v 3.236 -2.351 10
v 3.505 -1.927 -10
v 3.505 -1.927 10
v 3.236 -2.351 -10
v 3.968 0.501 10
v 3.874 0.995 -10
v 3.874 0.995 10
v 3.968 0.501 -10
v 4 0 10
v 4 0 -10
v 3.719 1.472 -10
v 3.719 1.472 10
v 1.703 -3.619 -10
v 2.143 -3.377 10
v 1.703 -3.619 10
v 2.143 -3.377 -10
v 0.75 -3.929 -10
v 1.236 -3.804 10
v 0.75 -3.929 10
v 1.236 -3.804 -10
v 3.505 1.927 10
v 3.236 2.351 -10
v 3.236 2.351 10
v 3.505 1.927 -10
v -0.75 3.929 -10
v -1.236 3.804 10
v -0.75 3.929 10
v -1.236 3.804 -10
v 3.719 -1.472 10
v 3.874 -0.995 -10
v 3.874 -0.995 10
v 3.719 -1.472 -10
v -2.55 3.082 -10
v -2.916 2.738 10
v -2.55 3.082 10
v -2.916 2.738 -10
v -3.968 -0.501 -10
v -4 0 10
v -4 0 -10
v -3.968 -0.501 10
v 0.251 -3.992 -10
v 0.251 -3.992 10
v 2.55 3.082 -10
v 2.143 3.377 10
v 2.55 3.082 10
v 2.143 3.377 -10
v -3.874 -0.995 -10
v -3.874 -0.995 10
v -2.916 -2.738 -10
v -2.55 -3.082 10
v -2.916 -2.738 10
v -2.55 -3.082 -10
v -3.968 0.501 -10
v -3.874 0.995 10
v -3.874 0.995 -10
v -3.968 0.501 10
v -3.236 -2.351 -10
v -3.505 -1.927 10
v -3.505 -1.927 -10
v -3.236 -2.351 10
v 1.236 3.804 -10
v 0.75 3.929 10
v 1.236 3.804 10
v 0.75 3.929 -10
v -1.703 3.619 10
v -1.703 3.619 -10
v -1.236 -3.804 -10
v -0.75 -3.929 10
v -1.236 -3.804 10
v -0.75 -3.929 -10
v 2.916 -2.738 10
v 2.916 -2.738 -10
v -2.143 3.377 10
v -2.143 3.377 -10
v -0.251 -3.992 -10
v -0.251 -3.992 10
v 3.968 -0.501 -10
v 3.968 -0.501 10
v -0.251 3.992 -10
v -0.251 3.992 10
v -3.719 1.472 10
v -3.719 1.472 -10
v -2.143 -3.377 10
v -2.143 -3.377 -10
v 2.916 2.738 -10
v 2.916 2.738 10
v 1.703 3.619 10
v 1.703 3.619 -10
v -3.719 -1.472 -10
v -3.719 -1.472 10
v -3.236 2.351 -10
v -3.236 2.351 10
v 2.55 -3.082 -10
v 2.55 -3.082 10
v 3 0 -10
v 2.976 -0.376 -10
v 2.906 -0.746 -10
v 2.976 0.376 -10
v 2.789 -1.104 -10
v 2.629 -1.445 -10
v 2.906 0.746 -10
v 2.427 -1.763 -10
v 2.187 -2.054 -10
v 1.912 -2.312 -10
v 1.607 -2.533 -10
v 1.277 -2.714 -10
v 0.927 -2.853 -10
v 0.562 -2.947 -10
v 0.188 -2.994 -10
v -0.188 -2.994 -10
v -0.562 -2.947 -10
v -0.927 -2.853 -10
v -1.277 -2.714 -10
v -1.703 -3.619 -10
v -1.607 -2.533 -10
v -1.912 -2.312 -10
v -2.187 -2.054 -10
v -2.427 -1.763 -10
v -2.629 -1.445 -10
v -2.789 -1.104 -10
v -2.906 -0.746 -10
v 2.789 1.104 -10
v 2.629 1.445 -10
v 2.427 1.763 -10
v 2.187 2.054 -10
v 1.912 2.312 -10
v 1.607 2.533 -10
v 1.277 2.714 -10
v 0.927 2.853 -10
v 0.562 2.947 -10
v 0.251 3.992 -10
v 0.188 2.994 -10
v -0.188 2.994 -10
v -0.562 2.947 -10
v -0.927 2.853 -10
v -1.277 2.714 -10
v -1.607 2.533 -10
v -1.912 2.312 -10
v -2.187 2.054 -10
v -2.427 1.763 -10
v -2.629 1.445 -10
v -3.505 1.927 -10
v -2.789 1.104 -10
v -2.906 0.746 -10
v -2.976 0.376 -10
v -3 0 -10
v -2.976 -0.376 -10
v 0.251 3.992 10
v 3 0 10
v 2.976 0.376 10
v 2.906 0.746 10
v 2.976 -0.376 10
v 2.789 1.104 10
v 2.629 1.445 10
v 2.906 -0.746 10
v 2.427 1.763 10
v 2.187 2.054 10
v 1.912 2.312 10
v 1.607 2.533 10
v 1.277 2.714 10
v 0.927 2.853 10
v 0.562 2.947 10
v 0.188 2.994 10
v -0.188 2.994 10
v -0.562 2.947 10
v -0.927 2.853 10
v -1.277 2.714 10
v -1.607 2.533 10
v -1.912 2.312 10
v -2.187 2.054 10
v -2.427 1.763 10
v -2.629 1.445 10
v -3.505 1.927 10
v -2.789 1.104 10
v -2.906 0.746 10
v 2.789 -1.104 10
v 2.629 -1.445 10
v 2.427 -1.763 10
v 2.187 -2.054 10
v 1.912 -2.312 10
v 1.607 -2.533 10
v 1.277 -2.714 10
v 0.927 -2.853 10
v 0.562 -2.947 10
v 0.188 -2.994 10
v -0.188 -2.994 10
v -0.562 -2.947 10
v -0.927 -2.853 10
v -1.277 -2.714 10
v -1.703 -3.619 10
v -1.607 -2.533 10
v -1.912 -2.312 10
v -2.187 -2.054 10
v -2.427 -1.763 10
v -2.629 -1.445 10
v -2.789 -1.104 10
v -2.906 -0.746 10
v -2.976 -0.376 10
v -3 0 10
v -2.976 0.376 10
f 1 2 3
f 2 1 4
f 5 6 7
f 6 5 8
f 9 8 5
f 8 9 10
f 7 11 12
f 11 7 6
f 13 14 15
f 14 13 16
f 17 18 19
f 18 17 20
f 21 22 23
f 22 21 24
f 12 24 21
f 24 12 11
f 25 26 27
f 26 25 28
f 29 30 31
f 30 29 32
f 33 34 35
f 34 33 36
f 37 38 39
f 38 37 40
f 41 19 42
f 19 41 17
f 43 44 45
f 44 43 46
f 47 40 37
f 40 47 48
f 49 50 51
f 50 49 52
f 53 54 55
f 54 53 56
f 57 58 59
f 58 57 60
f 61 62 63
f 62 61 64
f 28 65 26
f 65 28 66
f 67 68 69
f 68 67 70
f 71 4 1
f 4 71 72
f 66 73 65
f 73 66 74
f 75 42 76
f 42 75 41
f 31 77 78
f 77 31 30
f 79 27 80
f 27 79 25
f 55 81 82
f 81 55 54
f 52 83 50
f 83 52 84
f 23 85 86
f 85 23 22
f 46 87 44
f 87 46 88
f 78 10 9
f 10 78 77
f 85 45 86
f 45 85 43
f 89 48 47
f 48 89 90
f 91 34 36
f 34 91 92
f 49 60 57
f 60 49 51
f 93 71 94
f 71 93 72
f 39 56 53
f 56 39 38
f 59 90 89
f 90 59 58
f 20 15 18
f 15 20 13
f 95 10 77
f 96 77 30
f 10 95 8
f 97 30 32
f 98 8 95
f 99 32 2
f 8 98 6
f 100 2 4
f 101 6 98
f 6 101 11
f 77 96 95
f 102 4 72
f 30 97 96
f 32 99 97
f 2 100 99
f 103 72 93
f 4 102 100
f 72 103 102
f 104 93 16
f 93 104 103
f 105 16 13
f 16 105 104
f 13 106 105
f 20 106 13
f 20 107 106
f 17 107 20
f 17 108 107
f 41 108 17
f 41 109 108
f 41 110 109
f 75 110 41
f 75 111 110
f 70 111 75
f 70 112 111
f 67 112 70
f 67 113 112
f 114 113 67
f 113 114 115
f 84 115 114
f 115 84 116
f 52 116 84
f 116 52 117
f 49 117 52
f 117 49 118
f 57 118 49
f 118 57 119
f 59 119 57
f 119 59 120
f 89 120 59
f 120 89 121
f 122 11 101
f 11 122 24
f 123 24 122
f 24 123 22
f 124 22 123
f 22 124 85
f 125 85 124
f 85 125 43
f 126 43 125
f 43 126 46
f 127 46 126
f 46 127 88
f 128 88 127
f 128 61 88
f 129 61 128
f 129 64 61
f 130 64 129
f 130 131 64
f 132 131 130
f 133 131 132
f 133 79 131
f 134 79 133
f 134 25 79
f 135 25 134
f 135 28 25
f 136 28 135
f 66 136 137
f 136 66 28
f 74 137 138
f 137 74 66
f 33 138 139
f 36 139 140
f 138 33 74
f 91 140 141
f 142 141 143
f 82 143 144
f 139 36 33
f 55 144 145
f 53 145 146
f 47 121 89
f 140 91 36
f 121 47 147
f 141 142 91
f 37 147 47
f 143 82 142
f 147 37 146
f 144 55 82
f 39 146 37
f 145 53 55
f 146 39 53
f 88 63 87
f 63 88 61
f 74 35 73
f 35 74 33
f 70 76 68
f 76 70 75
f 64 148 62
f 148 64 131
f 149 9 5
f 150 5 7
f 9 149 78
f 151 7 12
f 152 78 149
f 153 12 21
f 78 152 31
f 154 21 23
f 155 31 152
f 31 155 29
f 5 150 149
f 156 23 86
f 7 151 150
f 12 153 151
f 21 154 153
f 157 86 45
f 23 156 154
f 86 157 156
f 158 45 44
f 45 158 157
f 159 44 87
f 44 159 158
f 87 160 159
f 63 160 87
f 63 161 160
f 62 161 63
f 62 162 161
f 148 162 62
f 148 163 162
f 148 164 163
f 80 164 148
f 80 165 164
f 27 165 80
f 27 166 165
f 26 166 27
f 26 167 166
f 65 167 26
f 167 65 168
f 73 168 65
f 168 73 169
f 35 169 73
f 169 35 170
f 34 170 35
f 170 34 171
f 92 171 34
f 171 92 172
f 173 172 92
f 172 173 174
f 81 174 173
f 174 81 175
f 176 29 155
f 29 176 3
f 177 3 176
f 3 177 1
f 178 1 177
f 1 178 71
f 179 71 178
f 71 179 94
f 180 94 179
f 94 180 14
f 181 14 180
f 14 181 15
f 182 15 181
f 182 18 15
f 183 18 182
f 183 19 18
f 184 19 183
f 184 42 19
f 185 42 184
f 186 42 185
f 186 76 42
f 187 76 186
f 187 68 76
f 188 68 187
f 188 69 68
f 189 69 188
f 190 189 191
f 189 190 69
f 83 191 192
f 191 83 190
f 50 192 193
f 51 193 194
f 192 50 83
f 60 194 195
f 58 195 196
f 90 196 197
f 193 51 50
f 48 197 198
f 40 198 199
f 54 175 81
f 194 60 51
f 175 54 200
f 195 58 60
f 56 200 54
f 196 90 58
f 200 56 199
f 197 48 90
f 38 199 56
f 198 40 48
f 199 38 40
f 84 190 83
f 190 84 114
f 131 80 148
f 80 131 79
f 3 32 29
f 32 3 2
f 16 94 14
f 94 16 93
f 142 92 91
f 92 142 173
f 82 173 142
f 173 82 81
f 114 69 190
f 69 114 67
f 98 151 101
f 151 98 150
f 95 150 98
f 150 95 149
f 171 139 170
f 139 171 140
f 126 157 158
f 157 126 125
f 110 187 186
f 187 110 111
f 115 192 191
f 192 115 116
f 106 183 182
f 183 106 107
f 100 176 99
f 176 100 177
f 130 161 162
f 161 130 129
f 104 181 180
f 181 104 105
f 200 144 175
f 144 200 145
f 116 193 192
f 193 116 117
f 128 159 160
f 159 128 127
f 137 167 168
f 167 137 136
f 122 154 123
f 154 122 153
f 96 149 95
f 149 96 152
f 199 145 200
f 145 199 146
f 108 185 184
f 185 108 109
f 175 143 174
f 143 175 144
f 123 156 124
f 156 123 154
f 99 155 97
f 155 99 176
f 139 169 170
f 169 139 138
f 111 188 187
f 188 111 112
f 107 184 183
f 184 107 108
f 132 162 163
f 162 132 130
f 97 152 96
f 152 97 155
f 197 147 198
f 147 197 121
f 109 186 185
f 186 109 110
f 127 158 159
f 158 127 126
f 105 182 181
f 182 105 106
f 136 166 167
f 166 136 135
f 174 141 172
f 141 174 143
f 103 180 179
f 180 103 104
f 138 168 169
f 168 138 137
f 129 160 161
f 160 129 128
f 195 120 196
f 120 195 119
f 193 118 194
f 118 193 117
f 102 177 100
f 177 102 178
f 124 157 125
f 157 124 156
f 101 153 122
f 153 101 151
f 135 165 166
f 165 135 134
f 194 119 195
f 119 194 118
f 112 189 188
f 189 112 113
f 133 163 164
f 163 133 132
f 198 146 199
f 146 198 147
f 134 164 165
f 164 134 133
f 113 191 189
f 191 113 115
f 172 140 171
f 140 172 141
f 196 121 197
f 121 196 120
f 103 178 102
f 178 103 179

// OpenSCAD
$fn = 50;


difference() {
	union() {
		translate(v = [0, 0, -10.0000000000]) {
			cylinder(h = 20, r = 4.0000000000);
		}
	}
	union() {
		translate(v = [0, 0, -100.0000000000]) {
			cylinder(h = 200, r = 3.0000000000);
		}
	}
}
